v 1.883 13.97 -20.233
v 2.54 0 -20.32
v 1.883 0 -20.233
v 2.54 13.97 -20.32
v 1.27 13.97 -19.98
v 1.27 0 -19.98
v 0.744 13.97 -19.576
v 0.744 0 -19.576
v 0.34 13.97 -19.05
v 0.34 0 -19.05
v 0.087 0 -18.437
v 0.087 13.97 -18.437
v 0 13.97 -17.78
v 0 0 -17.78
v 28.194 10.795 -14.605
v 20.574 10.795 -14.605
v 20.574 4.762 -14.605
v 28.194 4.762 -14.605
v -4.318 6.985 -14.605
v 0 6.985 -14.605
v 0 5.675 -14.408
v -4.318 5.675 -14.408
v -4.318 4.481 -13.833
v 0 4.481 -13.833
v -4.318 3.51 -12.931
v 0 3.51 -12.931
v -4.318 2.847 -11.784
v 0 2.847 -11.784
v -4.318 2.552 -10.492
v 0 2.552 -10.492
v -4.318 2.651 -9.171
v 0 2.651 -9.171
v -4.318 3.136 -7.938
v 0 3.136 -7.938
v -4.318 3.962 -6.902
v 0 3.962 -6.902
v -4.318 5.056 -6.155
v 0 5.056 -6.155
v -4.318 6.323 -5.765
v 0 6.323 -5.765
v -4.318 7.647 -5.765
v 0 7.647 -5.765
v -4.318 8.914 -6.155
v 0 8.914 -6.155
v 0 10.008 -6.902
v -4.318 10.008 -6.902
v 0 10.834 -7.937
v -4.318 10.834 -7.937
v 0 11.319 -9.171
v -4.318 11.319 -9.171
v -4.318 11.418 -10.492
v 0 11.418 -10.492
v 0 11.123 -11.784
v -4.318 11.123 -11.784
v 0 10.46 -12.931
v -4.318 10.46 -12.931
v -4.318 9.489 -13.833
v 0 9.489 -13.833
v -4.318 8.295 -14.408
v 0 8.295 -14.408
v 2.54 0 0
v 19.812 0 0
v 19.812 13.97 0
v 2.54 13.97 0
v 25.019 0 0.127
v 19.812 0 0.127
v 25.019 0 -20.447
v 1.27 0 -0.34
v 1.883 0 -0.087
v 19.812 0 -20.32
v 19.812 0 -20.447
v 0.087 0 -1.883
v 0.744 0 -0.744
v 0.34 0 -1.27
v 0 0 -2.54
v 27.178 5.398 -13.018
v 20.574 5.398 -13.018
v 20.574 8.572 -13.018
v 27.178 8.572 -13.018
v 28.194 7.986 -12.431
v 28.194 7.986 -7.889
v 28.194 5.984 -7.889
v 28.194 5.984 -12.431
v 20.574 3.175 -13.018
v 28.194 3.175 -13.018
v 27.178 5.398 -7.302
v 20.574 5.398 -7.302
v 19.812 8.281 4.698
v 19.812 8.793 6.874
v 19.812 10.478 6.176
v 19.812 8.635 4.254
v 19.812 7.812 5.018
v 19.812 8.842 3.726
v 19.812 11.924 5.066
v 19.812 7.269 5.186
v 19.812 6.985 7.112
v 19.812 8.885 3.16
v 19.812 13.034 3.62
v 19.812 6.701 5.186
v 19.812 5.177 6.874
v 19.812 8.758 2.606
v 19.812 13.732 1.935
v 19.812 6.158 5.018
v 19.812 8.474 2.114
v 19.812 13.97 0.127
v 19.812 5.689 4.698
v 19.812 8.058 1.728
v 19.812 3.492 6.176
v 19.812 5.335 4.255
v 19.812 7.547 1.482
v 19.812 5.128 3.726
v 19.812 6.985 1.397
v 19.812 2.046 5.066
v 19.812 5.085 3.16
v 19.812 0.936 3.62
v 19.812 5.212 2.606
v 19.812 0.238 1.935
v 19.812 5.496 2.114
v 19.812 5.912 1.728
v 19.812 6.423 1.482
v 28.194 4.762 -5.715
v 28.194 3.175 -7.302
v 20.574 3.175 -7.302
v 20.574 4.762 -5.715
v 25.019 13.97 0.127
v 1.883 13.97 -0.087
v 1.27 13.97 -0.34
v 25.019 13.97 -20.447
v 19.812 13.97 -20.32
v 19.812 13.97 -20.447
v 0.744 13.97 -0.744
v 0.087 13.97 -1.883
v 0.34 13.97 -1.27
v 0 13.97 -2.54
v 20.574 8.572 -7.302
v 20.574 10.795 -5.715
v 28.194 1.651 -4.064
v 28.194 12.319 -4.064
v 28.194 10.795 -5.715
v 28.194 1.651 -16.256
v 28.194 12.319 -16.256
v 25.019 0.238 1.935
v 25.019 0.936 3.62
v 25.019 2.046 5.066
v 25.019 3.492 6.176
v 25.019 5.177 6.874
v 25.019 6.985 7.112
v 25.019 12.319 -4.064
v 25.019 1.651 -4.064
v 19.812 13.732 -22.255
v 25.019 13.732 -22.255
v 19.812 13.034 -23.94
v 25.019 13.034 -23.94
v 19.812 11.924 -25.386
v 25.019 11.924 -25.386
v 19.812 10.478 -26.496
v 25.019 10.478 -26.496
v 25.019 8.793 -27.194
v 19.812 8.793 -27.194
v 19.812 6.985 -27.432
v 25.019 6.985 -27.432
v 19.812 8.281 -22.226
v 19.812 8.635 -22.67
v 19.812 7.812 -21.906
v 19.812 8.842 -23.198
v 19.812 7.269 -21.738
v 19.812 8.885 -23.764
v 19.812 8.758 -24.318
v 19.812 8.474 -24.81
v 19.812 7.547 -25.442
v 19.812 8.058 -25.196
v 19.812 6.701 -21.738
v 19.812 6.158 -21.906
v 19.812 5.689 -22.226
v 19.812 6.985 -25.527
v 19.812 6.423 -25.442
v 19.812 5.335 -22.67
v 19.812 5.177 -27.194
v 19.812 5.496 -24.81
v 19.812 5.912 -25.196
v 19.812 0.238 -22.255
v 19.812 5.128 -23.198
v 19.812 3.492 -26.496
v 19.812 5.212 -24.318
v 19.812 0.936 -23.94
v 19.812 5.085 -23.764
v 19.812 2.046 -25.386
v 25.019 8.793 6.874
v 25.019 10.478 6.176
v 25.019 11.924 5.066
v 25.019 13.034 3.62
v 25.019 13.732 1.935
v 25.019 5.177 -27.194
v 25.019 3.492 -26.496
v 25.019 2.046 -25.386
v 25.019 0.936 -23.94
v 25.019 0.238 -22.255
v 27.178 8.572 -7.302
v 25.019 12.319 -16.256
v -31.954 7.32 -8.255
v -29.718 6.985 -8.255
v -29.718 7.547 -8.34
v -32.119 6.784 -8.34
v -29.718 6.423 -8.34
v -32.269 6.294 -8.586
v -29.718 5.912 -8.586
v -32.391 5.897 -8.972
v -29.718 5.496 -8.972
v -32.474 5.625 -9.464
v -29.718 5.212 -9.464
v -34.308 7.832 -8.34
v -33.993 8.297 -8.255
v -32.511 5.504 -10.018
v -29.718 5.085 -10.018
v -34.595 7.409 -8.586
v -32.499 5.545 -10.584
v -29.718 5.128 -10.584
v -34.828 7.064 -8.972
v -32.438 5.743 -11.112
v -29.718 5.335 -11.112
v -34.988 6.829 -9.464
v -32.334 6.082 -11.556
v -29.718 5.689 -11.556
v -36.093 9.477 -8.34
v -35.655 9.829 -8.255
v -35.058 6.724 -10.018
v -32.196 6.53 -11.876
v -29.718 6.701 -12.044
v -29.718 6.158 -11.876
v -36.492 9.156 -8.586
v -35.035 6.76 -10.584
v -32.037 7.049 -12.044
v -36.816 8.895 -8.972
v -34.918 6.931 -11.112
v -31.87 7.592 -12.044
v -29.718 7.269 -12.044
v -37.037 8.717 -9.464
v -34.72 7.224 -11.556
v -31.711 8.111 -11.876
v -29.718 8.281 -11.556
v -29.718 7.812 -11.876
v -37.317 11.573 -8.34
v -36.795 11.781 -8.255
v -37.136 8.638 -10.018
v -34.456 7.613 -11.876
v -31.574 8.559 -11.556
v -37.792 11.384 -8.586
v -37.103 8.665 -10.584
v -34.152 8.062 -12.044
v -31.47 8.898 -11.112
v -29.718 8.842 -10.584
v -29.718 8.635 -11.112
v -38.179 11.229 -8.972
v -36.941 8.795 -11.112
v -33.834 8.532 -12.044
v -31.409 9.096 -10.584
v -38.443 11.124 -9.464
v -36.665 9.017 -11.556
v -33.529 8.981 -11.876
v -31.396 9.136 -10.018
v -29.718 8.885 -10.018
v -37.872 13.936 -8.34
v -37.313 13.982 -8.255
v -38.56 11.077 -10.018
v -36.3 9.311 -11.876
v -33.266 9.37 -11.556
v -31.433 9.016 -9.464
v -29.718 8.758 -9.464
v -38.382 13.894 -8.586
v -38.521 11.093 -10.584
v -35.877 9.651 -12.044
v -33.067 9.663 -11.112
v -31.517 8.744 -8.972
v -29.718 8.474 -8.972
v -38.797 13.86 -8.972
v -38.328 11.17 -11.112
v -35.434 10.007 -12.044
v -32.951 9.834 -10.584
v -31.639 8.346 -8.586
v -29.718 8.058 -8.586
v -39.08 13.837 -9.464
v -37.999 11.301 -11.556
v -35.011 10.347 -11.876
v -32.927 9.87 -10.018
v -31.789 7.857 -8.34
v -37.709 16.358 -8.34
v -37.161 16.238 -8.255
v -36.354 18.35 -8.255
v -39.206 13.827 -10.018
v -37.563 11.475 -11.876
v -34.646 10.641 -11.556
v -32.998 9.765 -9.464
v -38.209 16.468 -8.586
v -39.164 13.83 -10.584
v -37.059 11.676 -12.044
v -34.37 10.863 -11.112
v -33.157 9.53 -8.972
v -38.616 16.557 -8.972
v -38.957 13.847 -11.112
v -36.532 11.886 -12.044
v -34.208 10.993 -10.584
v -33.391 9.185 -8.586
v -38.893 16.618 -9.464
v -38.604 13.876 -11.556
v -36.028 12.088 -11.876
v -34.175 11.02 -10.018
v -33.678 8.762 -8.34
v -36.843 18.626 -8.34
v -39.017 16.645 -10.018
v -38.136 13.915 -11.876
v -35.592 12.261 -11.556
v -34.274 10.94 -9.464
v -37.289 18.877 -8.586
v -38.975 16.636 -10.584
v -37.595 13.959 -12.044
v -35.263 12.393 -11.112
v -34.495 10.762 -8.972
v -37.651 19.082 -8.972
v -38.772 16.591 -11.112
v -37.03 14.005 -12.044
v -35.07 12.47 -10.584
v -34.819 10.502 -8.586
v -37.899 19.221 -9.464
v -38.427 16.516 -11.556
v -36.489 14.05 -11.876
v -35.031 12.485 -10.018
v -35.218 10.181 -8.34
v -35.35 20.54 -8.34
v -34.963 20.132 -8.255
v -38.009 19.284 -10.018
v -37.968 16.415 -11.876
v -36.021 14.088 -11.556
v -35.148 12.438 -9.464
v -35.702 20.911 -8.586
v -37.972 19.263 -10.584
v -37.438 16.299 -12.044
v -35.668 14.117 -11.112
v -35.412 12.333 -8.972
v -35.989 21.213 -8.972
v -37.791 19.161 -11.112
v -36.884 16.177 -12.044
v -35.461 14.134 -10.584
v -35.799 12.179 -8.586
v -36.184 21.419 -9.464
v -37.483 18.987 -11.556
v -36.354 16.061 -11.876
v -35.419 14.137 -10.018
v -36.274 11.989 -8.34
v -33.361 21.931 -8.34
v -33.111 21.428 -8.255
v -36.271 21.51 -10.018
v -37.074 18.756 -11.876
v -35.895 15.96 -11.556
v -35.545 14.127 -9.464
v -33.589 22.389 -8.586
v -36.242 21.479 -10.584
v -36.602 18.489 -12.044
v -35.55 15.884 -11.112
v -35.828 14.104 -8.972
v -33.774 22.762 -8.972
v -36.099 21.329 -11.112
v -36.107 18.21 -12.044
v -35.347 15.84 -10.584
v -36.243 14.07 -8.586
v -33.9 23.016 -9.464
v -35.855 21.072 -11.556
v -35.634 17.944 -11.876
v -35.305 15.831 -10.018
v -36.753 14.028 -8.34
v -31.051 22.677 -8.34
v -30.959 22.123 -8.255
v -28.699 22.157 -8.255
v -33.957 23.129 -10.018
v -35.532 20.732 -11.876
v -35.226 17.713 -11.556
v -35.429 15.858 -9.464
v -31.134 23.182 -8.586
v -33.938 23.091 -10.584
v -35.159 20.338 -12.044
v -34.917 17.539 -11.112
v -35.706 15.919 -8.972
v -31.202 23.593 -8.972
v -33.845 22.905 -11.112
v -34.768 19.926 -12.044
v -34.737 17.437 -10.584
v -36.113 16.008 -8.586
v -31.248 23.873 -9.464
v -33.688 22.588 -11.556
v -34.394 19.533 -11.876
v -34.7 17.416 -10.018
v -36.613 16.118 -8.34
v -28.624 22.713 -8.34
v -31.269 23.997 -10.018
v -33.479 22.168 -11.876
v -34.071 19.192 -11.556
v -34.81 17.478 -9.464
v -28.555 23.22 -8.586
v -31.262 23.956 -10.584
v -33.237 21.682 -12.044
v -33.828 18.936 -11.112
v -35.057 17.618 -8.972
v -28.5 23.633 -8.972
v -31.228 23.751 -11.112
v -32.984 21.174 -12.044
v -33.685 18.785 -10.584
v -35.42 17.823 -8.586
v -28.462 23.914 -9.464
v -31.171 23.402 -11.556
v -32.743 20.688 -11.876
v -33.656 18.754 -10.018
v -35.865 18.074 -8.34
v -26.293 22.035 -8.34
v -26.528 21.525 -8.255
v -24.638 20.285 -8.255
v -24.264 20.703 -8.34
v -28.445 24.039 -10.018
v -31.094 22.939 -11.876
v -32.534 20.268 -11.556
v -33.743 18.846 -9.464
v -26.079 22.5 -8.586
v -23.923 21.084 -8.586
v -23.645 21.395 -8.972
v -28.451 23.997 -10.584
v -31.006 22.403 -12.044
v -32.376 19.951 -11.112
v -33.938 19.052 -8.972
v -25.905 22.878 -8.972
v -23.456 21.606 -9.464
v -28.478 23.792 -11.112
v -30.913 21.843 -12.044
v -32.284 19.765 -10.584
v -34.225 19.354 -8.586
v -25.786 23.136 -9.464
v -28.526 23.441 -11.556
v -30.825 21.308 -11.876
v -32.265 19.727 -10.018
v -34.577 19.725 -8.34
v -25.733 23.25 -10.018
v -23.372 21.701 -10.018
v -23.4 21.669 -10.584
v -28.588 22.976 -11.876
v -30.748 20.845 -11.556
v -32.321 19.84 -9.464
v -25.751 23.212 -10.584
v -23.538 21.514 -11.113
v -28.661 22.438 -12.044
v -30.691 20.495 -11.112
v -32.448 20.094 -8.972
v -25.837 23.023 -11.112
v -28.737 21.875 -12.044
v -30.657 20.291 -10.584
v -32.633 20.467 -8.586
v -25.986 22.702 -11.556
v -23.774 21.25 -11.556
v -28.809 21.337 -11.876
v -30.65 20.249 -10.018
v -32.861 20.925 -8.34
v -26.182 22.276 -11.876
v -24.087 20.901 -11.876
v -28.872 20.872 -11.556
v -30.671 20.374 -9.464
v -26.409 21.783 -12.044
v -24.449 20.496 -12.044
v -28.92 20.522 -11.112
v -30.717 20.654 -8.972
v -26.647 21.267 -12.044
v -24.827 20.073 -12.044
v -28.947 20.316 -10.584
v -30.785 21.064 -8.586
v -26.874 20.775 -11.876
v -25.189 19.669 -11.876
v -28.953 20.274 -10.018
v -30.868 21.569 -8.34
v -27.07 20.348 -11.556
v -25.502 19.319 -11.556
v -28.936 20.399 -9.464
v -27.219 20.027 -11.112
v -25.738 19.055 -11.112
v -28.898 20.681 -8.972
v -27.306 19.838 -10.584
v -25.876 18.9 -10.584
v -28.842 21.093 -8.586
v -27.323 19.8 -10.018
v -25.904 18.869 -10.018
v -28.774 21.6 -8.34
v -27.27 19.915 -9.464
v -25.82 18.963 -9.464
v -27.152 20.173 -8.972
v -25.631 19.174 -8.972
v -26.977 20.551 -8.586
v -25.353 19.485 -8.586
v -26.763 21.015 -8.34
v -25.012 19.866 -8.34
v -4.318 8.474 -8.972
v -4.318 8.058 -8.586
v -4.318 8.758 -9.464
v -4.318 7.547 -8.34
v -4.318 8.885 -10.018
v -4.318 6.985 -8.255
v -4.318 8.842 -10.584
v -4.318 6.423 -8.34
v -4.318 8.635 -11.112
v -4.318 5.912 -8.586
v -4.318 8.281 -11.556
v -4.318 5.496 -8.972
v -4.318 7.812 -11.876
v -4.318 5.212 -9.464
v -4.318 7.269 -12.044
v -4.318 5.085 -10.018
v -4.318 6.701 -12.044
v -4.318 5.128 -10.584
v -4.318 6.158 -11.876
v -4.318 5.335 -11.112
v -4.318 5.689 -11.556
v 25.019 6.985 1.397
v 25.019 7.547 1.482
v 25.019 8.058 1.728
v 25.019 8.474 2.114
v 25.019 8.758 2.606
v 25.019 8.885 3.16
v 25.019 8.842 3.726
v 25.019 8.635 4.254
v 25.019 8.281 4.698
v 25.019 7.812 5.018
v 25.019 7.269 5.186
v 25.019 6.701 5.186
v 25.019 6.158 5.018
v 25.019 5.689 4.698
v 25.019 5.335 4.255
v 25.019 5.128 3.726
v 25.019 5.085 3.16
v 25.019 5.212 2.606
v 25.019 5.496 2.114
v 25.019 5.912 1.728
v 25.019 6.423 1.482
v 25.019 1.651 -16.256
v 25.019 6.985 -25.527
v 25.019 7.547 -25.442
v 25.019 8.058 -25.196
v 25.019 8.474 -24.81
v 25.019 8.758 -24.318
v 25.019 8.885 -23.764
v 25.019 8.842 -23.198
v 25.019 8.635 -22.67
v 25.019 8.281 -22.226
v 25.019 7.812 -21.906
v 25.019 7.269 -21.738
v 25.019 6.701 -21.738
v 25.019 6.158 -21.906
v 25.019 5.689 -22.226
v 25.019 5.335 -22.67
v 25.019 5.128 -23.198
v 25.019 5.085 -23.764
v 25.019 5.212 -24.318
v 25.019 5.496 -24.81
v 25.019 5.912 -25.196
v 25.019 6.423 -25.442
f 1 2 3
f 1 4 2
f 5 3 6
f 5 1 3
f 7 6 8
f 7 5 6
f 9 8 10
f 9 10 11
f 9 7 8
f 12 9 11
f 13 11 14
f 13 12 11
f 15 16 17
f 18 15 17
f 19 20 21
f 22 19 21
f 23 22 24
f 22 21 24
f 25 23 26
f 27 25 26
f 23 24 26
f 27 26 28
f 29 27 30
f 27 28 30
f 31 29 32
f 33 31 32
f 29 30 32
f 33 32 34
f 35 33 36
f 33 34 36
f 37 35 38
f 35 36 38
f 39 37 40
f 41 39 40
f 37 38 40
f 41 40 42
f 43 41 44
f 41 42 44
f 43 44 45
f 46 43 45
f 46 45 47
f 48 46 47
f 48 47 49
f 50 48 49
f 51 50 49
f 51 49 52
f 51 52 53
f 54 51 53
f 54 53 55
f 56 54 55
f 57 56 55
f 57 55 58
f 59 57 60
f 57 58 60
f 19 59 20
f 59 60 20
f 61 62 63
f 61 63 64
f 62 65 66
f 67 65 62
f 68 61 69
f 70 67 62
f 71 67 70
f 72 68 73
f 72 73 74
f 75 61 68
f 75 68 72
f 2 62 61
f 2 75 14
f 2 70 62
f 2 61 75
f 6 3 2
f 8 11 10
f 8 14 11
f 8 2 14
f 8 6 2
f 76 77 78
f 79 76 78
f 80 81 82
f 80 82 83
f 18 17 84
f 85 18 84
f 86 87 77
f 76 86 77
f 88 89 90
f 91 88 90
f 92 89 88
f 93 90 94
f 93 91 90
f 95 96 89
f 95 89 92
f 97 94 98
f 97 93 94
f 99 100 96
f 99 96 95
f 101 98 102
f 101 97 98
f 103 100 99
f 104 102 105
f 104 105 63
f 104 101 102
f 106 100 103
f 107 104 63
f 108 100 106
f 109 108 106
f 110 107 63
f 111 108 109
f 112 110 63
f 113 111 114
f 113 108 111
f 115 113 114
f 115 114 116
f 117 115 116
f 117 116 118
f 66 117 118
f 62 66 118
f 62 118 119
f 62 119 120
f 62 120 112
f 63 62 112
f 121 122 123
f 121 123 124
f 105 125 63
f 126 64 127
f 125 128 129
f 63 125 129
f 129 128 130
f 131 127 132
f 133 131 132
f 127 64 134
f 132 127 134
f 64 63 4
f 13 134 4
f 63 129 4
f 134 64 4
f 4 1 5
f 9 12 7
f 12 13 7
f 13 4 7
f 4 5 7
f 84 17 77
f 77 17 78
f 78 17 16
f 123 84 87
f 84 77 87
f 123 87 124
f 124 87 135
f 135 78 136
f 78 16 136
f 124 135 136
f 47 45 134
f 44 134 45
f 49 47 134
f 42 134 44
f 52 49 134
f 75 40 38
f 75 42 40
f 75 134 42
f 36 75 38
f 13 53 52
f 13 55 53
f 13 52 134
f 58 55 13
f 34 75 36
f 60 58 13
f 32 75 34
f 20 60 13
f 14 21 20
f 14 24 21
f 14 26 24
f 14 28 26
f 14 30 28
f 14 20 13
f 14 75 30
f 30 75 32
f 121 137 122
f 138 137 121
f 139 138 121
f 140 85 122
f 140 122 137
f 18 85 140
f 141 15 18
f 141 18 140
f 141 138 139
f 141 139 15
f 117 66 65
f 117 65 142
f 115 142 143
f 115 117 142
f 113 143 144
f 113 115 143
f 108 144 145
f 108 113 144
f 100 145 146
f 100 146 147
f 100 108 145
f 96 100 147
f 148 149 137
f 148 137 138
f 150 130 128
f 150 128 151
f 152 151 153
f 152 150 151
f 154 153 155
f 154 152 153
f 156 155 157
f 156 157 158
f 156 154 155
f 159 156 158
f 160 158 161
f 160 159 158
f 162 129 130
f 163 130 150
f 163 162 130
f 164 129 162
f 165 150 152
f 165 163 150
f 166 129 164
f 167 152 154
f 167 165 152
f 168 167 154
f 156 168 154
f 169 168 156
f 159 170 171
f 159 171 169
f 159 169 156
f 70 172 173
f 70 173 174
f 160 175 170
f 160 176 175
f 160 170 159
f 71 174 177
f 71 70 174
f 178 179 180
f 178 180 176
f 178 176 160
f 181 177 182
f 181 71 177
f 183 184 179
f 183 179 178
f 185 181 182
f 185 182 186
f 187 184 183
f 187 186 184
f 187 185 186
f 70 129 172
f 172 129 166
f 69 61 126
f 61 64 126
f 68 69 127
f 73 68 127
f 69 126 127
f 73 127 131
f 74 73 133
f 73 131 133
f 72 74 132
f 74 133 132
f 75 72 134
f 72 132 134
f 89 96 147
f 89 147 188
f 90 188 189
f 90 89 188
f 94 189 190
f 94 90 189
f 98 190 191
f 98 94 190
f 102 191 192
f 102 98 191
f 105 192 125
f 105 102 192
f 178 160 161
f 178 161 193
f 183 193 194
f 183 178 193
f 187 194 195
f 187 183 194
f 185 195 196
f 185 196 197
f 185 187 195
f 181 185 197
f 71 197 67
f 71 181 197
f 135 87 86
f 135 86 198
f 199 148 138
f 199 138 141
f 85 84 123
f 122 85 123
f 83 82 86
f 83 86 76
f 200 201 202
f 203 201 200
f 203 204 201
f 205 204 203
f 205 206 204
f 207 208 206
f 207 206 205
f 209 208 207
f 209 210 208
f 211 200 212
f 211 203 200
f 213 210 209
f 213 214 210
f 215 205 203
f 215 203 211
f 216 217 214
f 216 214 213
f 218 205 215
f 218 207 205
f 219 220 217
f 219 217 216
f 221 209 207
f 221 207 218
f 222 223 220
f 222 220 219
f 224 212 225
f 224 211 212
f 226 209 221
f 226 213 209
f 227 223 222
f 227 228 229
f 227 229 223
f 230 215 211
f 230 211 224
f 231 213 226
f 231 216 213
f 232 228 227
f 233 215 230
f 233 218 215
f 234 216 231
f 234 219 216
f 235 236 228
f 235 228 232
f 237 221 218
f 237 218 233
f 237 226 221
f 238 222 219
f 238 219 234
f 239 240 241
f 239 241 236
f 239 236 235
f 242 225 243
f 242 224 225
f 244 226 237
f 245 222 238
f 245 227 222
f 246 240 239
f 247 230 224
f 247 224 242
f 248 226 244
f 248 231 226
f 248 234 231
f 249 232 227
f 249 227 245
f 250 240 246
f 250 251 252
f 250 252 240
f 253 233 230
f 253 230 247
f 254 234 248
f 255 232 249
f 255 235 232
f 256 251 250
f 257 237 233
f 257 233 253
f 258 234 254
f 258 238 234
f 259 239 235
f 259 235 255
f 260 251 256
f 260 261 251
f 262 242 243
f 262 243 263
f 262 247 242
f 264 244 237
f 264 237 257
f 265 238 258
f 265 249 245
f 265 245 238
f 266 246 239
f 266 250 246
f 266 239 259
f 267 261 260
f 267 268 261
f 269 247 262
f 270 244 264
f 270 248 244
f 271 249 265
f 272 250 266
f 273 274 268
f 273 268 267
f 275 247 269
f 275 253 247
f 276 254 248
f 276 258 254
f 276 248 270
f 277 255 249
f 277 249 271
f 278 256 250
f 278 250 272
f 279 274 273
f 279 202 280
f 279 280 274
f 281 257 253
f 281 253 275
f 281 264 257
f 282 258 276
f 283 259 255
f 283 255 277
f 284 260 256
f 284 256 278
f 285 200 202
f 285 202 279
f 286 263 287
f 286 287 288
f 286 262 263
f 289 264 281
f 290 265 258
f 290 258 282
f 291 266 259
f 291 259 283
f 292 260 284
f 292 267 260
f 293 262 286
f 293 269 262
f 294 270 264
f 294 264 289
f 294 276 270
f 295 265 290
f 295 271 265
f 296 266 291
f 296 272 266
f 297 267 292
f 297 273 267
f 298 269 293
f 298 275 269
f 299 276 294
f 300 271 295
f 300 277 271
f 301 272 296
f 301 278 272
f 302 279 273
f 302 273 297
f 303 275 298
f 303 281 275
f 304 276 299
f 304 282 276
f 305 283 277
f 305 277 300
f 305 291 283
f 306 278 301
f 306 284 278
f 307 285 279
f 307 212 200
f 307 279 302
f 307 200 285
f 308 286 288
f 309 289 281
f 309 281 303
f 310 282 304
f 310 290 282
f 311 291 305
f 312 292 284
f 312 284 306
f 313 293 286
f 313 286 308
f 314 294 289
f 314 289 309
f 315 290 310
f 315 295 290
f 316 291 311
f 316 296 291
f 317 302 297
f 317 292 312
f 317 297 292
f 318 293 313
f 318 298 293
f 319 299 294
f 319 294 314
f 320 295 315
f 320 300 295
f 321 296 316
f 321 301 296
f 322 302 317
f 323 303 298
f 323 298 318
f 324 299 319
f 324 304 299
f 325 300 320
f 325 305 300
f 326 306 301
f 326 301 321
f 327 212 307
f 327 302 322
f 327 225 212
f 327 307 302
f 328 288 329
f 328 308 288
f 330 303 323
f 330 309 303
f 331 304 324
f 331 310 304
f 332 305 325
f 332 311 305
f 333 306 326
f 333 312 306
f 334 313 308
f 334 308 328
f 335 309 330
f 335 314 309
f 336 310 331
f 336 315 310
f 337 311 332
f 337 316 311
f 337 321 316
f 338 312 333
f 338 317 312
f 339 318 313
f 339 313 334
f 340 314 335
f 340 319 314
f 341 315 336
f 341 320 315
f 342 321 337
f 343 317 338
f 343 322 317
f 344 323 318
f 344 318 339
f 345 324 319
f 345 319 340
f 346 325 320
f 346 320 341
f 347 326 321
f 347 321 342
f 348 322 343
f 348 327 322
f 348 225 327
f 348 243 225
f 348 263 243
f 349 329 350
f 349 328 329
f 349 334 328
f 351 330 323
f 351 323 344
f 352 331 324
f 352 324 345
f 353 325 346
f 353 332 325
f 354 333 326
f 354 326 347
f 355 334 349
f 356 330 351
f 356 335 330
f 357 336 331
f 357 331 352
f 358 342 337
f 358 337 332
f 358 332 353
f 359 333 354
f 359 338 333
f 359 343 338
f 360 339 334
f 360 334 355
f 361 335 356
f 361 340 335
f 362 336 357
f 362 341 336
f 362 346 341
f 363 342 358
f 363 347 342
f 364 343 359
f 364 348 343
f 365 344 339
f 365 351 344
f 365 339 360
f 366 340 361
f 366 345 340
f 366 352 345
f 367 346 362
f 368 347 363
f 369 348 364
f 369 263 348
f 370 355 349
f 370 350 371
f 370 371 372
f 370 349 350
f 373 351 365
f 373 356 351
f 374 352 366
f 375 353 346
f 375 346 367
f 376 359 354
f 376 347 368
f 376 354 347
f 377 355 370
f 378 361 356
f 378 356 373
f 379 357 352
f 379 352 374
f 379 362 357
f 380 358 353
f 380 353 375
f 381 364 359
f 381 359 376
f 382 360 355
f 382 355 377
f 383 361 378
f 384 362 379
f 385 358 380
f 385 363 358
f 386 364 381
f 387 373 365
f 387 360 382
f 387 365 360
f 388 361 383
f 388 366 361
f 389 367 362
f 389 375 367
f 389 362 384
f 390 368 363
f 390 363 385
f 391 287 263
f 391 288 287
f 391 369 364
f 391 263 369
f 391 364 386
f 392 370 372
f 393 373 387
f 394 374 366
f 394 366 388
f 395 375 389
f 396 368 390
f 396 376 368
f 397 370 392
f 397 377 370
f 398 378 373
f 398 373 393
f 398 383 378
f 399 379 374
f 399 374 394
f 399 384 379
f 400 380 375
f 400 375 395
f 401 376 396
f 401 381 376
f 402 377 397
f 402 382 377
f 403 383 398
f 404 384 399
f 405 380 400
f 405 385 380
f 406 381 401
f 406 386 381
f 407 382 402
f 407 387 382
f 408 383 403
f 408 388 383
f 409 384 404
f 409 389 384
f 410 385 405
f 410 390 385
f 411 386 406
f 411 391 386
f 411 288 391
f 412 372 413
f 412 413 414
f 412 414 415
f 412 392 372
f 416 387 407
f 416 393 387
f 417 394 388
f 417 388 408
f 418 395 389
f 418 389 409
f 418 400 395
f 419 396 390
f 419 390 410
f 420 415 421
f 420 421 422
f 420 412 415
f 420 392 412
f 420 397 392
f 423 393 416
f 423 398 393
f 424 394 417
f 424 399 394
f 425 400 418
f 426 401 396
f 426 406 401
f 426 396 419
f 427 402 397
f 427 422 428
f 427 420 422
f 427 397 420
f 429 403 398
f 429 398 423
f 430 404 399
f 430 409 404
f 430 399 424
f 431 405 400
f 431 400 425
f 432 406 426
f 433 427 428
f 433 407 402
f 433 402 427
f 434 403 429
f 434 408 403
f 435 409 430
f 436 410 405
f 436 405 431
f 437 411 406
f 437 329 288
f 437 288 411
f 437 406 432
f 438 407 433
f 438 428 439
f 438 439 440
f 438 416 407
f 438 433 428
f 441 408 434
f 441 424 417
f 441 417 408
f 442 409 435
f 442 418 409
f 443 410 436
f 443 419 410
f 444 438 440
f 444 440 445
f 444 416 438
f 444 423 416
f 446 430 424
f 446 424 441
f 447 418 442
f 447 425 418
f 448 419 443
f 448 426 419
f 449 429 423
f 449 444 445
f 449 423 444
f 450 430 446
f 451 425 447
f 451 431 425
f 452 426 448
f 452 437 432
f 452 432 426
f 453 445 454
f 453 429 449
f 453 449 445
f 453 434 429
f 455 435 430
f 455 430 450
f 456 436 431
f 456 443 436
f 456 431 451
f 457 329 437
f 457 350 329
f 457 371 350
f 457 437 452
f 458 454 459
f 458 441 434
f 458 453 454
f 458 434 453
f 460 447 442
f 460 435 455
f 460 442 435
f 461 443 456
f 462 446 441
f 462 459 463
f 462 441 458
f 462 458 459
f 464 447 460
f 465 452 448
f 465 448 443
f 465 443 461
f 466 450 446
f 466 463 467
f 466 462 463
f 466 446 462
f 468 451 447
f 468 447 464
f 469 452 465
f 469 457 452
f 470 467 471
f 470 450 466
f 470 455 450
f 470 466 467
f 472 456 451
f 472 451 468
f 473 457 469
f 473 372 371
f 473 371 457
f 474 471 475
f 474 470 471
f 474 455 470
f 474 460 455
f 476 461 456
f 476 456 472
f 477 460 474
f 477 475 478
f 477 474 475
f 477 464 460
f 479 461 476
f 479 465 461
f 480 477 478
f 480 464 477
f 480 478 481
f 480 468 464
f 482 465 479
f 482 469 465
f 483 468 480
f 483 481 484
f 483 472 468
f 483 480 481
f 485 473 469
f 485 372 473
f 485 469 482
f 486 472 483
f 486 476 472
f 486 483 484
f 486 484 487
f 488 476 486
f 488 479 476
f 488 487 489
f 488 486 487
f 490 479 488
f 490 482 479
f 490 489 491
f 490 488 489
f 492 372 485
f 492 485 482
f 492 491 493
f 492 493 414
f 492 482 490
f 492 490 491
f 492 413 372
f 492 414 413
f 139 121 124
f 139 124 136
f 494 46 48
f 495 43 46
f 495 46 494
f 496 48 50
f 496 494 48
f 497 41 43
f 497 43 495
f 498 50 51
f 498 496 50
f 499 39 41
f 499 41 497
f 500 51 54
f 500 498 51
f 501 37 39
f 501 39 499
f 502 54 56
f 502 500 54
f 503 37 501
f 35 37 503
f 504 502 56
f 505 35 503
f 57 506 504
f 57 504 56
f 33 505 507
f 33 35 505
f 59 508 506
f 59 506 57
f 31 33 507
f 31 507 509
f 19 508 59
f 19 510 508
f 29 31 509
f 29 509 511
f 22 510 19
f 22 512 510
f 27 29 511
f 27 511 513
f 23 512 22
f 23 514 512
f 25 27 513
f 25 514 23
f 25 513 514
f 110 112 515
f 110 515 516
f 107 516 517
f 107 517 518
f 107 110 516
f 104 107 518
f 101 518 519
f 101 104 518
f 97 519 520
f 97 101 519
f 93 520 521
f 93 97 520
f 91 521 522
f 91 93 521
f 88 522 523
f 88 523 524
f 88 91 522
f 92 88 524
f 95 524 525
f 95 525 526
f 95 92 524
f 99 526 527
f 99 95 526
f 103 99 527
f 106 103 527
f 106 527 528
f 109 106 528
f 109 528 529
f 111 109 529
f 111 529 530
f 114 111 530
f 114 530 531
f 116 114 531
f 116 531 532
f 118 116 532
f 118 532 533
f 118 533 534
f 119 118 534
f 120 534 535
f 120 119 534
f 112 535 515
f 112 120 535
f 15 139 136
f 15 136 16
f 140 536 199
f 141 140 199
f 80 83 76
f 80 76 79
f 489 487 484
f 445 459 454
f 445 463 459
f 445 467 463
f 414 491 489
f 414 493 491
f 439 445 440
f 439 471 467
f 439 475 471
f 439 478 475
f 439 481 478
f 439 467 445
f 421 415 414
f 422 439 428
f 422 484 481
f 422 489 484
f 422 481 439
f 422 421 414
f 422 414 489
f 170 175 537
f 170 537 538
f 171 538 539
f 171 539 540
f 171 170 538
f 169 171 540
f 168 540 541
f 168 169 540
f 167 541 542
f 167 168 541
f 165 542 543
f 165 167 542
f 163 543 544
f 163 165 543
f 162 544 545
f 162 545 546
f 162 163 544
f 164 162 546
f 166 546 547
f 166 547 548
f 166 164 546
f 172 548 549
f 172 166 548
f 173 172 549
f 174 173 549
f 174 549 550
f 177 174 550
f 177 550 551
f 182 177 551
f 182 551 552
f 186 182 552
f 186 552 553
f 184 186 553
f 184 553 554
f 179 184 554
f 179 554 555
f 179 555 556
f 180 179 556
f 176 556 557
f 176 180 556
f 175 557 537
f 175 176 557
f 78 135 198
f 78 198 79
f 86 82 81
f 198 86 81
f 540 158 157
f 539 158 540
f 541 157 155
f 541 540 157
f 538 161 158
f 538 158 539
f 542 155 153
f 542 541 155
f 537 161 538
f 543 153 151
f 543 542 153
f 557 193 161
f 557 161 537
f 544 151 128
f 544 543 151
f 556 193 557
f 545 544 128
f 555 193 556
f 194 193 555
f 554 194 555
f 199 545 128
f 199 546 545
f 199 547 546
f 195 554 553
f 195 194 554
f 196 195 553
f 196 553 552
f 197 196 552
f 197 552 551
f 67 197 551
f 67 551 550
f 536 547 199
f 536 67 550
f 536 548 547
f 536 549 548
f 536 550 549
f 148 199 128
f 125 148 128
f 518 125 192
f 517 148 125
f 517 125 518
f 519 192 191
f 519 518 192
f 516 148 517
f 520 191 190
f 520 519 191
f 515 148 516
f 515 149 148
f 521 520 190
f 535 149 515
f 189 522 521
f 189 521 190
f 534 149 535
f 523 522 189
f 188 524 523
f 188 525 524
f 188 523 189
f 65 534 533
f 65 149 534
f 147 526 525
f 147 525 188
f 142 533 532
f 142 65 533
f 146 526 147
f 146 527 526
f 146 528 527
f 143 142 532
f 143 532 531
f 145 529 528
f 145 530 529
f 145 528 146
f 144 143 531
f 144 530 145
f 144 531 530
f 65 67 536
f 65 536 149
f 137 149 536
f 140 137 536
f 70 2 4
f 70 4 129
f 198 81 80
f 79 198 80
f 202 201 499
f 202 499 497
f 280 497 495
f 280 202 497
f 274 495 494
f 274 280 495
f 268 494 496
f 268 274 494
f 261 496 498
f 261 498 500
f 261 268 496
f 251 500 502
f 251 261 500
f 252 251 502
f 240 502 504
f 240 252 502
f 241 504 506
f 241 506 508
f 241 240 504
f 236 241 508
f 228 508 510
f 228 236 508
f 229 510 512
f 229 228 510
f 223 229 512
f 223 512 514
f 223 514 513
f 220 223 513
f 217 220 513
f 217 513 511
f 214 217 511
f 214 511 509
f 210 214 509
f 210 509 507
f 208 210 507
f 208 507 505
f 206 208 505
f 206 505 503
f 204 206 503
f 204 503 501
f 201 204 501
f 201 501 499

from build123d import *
from OCP.BRepFilletAPI import BRepFilletAPI_MakeChamfer

# Parameters (mm, degrees)
BOSS_EXTRUDE1_DEPTH = 13.97
SKETCH2_W           = 12.192
SKETCH2_H           = 10.668
BOSS_EXTRUDE2_DEPTH = 3.175
SKETCH3_W           = 5.715
SKETCH3_H           = 3.175
CUT_EXTRUDE1_DEPTH  = 7.62
CHAMFER1_SIZE       = 1.016
CHAMFER1_SIZE2      = 0.586587873
SKETCH4_R           = 1.905
CUT_EXTRUDE2_DEPTH  = 40.668953667
FILLET1_R           = 2.54
SKETCH5_R           = 4.445
BOSS_EXTRUDE3_DEPTH = 4.318
SKETCH6_R           = 1.905


with BuildPart() as part:
    # Sketch1 → Boss-Extrude1 (new body)
    with BuildSketch(Plane(origin=(0, 0, 0), x_dir=(1, 0, 0), z_dir=(0, 1, 0))):
        Polygon((0, 0), (0, 20.32), (19.812, 20.32), (19.812, 27.432), (25.019, 27.432), (25.019, -7.112), (19.812, -7.112), (19.812, 0), align=None)
    extrude(amount=BOSS_EXTRUDE1_DEPTH)

    # Sketch2 → Boss-Extrude2 (add)
    with BuildSketch(Plane(origin=(25.019, 0, 0), x_dir=(0, 0, -1), z_dir=(1, 0, 0))):
        with Locations((10.16, 6.985)):
            Rectangle(SKETCH2_W, SKETCH2_H)
    extrude(amount=BOSS_EXTRUDE2_DEPTH)

    # Sketch3 → Cut-Extrude1 (cut)
    with BuildSketch(Plane(origin=(28.194, 0, 0), x_dir=(0, 0, -1), z_dir=(1, 0, 0))):
        Polygon((5.715, 10.795), (14.605, 10.795), (14.605, 4.7625), (13.0175, 3.175), (7.3025, 3.175), (5.715, 4.7625), align=None)
        with Locations((10.16, 6.985)):
            Rectangle(SKETCH3_W, SKETCH3_H, mode=Mode.SUBTRACT)
    extrude(amount=-CUT_EXTRUDE1_DEPTH, mode=Mode.SUBTRACT)

    # Chamfer1: one chamfer whose edges measure the first distance from different faces: ONE call of the kernel's chamfer builder (chamfer() names one face for all edges)
    chamfer1_edges_1 = [part.edges().sort_by_distance(p)[0] for p in [
        (28.194, 6.985, -13.0175),
    ]]
    chamfer1_side_1 = [part.faces().sort_by_distance(p)[0] for p in [
        (24.384, 6.985, -13.0175),
    ]]
    chamfer1_edges_2 = [part.edges().sort_by_distance(p)[0] for p in [
        (28.194, 5.3975, -10.16),
    ]]
    chamfer1_side_2 = [part.faces().sort_by_distance(p)[0] for p in [
        (24.384, 5.3975, -10.16),
    ]]
    chamfer1_edges_3 = [part.edges().sort_by_distance(p)[0] for p in [
        (28.194, 6.985, -7.3025),
    ]]
    chamfer1_side_3 = [part.faces().sort_by_distance(p)[0] for p in [
        (24.384, 6.985, -7.3025),
    ]]
    chamfer1_edges_4 = [part.edges().sort_by_distance(p)[0] for p in [
        (28.194, 8.5725, -10.16),
    ]]
    chamfer1_side_4 = [part.faces().sort_by_distance(p)[0] for p in [
        (24.384, 8.5725, -10.16),
    ]]
    chamfer1 = BRepFilletAPI_MakeChamfer(part.part.solid().wrapped)
    for e in chamfer1_edges_1:
        chamfer1.Add(CHAMFER1_SIZE, CHAMFER1_SIZE2, e.wrapped, chamfer1_side_1[0].wrapped)  # the first distance lies on this face
    for e in chamfer1_edges_2:
        chamfer1.Add(CHAMFER1_SIZE, CHAMFER1_SIZE2, e.wrapped, chamfer1_side_2[0].wrapped)  # the first distance lies on this face
    for e in chamfer1_edges_3:
        chamfer1.Add(CHAMFER1_SIZE, CHAMFER1_SIZE2, e.wrapped, chamfer1_side_3[0].wrapped)  # the first distance lies on this face
    for e in chamfer1_edges_4:
        chamfer1.Add(CHAMFER1_SIZE, CHAMFER1_SIZE2, e.wrapped, chamfer1_side_4[0].wrapped)  # the first distance lies on this face
    add(Compound.cast(chamfer1.Shape()), mode=Mode.REPLACE)

    # Sketch4 → Cut-Extrude2 (cut, through all)
    with BuildSketch(Plane(origin=(25.019, 0, 0), x_dir=(0, 0, -1), z_dir=(1, 0, 0))):
        with BuildLine():
            Line((-7.112, 0), (-0.127, 0))
            ThreePointArc((-0.127, 0), (-5.06614087, 2.045859136), (-7.112, 6.985000009))
            Line((-7.112, 6.985000009), (-7.112, 0))
        make_face()
        with BuildLine():
            Line((-7.112, 13.97), (-7.112, 6.985000009))
            ThreePointArc((-7.112, 6.985000009), (-5.066140864, 11.92414087), (-0.127, 13.97))
            Line((-0.127, 13.97), (-7.112, 13.97))
        make_face()
        with BuildLine():
            ThreePointArc((27.432, 6.985), (25.386140867, 2.045859133), (20.447, 0))
            Line((20.447, 0), (27.432, 0))
            Line((27.432, 0), (27.432, 6.985))
        make_face()
        with BuildLine():
            ThreePointArc((20.447, 13.97), (25.386140867, 11.924140867), (27.432, 6.985))
            Line((27.432, 6.985), (27.432, 13.97))
            Line((27.432, 13.97), (20.447, 13.97))
        make_face()
        with Locations((-3.302, 6.985)):
            Circle(SKETCH4_R)
        with Locations((23.622, 6.985)):
            Circle(SKETCH4_R)
    extrude(amount=-CUT_EXTRUDE2_DEPTH, mode=Mode.SUBTRACT)

    # Fillet1
    fillet1_edges = [part.edges().sort_by_distance(p)[0] for p in [
        (0, 6.985, 0),
        (0, 6.985, -20.32),
    ]]
    fillet(fillet1_edges, radius=FILLET1_R)

    # Sketch5 → Boss-Extrude3 (add)
    with BuildSketch(Plane.ZY):
        with Locations((-10.16, 6.985)):
            Circle(SKETCH5_R)
    extrude(amount=BOSS_EXTRUDE3_DEPTH)

    # Sweep1: sweep along a path in Sketch7
    with BuildLine(Plane(origin=(0, 0, -10.16), x_dir=(-1, 0, 0), z_dir=(0, 0, -1))) as sweep1_path:
        Line((4.318, 6.985), (29.718, 6.985))
        ThreePointArc((29.718, 6.985), (36.836393375, 17.323984324), (24.638, 20.284612663))
    # Sketch6 → Sweep1 (sweep)
    with BuildSketch(Plane.ZY.offset(4.318)):
        with Locations((-10.16, 6.985)):
            Circle(SKETCH6_R)
    sweep(path=sweep1_path.line)


solid = part.part
